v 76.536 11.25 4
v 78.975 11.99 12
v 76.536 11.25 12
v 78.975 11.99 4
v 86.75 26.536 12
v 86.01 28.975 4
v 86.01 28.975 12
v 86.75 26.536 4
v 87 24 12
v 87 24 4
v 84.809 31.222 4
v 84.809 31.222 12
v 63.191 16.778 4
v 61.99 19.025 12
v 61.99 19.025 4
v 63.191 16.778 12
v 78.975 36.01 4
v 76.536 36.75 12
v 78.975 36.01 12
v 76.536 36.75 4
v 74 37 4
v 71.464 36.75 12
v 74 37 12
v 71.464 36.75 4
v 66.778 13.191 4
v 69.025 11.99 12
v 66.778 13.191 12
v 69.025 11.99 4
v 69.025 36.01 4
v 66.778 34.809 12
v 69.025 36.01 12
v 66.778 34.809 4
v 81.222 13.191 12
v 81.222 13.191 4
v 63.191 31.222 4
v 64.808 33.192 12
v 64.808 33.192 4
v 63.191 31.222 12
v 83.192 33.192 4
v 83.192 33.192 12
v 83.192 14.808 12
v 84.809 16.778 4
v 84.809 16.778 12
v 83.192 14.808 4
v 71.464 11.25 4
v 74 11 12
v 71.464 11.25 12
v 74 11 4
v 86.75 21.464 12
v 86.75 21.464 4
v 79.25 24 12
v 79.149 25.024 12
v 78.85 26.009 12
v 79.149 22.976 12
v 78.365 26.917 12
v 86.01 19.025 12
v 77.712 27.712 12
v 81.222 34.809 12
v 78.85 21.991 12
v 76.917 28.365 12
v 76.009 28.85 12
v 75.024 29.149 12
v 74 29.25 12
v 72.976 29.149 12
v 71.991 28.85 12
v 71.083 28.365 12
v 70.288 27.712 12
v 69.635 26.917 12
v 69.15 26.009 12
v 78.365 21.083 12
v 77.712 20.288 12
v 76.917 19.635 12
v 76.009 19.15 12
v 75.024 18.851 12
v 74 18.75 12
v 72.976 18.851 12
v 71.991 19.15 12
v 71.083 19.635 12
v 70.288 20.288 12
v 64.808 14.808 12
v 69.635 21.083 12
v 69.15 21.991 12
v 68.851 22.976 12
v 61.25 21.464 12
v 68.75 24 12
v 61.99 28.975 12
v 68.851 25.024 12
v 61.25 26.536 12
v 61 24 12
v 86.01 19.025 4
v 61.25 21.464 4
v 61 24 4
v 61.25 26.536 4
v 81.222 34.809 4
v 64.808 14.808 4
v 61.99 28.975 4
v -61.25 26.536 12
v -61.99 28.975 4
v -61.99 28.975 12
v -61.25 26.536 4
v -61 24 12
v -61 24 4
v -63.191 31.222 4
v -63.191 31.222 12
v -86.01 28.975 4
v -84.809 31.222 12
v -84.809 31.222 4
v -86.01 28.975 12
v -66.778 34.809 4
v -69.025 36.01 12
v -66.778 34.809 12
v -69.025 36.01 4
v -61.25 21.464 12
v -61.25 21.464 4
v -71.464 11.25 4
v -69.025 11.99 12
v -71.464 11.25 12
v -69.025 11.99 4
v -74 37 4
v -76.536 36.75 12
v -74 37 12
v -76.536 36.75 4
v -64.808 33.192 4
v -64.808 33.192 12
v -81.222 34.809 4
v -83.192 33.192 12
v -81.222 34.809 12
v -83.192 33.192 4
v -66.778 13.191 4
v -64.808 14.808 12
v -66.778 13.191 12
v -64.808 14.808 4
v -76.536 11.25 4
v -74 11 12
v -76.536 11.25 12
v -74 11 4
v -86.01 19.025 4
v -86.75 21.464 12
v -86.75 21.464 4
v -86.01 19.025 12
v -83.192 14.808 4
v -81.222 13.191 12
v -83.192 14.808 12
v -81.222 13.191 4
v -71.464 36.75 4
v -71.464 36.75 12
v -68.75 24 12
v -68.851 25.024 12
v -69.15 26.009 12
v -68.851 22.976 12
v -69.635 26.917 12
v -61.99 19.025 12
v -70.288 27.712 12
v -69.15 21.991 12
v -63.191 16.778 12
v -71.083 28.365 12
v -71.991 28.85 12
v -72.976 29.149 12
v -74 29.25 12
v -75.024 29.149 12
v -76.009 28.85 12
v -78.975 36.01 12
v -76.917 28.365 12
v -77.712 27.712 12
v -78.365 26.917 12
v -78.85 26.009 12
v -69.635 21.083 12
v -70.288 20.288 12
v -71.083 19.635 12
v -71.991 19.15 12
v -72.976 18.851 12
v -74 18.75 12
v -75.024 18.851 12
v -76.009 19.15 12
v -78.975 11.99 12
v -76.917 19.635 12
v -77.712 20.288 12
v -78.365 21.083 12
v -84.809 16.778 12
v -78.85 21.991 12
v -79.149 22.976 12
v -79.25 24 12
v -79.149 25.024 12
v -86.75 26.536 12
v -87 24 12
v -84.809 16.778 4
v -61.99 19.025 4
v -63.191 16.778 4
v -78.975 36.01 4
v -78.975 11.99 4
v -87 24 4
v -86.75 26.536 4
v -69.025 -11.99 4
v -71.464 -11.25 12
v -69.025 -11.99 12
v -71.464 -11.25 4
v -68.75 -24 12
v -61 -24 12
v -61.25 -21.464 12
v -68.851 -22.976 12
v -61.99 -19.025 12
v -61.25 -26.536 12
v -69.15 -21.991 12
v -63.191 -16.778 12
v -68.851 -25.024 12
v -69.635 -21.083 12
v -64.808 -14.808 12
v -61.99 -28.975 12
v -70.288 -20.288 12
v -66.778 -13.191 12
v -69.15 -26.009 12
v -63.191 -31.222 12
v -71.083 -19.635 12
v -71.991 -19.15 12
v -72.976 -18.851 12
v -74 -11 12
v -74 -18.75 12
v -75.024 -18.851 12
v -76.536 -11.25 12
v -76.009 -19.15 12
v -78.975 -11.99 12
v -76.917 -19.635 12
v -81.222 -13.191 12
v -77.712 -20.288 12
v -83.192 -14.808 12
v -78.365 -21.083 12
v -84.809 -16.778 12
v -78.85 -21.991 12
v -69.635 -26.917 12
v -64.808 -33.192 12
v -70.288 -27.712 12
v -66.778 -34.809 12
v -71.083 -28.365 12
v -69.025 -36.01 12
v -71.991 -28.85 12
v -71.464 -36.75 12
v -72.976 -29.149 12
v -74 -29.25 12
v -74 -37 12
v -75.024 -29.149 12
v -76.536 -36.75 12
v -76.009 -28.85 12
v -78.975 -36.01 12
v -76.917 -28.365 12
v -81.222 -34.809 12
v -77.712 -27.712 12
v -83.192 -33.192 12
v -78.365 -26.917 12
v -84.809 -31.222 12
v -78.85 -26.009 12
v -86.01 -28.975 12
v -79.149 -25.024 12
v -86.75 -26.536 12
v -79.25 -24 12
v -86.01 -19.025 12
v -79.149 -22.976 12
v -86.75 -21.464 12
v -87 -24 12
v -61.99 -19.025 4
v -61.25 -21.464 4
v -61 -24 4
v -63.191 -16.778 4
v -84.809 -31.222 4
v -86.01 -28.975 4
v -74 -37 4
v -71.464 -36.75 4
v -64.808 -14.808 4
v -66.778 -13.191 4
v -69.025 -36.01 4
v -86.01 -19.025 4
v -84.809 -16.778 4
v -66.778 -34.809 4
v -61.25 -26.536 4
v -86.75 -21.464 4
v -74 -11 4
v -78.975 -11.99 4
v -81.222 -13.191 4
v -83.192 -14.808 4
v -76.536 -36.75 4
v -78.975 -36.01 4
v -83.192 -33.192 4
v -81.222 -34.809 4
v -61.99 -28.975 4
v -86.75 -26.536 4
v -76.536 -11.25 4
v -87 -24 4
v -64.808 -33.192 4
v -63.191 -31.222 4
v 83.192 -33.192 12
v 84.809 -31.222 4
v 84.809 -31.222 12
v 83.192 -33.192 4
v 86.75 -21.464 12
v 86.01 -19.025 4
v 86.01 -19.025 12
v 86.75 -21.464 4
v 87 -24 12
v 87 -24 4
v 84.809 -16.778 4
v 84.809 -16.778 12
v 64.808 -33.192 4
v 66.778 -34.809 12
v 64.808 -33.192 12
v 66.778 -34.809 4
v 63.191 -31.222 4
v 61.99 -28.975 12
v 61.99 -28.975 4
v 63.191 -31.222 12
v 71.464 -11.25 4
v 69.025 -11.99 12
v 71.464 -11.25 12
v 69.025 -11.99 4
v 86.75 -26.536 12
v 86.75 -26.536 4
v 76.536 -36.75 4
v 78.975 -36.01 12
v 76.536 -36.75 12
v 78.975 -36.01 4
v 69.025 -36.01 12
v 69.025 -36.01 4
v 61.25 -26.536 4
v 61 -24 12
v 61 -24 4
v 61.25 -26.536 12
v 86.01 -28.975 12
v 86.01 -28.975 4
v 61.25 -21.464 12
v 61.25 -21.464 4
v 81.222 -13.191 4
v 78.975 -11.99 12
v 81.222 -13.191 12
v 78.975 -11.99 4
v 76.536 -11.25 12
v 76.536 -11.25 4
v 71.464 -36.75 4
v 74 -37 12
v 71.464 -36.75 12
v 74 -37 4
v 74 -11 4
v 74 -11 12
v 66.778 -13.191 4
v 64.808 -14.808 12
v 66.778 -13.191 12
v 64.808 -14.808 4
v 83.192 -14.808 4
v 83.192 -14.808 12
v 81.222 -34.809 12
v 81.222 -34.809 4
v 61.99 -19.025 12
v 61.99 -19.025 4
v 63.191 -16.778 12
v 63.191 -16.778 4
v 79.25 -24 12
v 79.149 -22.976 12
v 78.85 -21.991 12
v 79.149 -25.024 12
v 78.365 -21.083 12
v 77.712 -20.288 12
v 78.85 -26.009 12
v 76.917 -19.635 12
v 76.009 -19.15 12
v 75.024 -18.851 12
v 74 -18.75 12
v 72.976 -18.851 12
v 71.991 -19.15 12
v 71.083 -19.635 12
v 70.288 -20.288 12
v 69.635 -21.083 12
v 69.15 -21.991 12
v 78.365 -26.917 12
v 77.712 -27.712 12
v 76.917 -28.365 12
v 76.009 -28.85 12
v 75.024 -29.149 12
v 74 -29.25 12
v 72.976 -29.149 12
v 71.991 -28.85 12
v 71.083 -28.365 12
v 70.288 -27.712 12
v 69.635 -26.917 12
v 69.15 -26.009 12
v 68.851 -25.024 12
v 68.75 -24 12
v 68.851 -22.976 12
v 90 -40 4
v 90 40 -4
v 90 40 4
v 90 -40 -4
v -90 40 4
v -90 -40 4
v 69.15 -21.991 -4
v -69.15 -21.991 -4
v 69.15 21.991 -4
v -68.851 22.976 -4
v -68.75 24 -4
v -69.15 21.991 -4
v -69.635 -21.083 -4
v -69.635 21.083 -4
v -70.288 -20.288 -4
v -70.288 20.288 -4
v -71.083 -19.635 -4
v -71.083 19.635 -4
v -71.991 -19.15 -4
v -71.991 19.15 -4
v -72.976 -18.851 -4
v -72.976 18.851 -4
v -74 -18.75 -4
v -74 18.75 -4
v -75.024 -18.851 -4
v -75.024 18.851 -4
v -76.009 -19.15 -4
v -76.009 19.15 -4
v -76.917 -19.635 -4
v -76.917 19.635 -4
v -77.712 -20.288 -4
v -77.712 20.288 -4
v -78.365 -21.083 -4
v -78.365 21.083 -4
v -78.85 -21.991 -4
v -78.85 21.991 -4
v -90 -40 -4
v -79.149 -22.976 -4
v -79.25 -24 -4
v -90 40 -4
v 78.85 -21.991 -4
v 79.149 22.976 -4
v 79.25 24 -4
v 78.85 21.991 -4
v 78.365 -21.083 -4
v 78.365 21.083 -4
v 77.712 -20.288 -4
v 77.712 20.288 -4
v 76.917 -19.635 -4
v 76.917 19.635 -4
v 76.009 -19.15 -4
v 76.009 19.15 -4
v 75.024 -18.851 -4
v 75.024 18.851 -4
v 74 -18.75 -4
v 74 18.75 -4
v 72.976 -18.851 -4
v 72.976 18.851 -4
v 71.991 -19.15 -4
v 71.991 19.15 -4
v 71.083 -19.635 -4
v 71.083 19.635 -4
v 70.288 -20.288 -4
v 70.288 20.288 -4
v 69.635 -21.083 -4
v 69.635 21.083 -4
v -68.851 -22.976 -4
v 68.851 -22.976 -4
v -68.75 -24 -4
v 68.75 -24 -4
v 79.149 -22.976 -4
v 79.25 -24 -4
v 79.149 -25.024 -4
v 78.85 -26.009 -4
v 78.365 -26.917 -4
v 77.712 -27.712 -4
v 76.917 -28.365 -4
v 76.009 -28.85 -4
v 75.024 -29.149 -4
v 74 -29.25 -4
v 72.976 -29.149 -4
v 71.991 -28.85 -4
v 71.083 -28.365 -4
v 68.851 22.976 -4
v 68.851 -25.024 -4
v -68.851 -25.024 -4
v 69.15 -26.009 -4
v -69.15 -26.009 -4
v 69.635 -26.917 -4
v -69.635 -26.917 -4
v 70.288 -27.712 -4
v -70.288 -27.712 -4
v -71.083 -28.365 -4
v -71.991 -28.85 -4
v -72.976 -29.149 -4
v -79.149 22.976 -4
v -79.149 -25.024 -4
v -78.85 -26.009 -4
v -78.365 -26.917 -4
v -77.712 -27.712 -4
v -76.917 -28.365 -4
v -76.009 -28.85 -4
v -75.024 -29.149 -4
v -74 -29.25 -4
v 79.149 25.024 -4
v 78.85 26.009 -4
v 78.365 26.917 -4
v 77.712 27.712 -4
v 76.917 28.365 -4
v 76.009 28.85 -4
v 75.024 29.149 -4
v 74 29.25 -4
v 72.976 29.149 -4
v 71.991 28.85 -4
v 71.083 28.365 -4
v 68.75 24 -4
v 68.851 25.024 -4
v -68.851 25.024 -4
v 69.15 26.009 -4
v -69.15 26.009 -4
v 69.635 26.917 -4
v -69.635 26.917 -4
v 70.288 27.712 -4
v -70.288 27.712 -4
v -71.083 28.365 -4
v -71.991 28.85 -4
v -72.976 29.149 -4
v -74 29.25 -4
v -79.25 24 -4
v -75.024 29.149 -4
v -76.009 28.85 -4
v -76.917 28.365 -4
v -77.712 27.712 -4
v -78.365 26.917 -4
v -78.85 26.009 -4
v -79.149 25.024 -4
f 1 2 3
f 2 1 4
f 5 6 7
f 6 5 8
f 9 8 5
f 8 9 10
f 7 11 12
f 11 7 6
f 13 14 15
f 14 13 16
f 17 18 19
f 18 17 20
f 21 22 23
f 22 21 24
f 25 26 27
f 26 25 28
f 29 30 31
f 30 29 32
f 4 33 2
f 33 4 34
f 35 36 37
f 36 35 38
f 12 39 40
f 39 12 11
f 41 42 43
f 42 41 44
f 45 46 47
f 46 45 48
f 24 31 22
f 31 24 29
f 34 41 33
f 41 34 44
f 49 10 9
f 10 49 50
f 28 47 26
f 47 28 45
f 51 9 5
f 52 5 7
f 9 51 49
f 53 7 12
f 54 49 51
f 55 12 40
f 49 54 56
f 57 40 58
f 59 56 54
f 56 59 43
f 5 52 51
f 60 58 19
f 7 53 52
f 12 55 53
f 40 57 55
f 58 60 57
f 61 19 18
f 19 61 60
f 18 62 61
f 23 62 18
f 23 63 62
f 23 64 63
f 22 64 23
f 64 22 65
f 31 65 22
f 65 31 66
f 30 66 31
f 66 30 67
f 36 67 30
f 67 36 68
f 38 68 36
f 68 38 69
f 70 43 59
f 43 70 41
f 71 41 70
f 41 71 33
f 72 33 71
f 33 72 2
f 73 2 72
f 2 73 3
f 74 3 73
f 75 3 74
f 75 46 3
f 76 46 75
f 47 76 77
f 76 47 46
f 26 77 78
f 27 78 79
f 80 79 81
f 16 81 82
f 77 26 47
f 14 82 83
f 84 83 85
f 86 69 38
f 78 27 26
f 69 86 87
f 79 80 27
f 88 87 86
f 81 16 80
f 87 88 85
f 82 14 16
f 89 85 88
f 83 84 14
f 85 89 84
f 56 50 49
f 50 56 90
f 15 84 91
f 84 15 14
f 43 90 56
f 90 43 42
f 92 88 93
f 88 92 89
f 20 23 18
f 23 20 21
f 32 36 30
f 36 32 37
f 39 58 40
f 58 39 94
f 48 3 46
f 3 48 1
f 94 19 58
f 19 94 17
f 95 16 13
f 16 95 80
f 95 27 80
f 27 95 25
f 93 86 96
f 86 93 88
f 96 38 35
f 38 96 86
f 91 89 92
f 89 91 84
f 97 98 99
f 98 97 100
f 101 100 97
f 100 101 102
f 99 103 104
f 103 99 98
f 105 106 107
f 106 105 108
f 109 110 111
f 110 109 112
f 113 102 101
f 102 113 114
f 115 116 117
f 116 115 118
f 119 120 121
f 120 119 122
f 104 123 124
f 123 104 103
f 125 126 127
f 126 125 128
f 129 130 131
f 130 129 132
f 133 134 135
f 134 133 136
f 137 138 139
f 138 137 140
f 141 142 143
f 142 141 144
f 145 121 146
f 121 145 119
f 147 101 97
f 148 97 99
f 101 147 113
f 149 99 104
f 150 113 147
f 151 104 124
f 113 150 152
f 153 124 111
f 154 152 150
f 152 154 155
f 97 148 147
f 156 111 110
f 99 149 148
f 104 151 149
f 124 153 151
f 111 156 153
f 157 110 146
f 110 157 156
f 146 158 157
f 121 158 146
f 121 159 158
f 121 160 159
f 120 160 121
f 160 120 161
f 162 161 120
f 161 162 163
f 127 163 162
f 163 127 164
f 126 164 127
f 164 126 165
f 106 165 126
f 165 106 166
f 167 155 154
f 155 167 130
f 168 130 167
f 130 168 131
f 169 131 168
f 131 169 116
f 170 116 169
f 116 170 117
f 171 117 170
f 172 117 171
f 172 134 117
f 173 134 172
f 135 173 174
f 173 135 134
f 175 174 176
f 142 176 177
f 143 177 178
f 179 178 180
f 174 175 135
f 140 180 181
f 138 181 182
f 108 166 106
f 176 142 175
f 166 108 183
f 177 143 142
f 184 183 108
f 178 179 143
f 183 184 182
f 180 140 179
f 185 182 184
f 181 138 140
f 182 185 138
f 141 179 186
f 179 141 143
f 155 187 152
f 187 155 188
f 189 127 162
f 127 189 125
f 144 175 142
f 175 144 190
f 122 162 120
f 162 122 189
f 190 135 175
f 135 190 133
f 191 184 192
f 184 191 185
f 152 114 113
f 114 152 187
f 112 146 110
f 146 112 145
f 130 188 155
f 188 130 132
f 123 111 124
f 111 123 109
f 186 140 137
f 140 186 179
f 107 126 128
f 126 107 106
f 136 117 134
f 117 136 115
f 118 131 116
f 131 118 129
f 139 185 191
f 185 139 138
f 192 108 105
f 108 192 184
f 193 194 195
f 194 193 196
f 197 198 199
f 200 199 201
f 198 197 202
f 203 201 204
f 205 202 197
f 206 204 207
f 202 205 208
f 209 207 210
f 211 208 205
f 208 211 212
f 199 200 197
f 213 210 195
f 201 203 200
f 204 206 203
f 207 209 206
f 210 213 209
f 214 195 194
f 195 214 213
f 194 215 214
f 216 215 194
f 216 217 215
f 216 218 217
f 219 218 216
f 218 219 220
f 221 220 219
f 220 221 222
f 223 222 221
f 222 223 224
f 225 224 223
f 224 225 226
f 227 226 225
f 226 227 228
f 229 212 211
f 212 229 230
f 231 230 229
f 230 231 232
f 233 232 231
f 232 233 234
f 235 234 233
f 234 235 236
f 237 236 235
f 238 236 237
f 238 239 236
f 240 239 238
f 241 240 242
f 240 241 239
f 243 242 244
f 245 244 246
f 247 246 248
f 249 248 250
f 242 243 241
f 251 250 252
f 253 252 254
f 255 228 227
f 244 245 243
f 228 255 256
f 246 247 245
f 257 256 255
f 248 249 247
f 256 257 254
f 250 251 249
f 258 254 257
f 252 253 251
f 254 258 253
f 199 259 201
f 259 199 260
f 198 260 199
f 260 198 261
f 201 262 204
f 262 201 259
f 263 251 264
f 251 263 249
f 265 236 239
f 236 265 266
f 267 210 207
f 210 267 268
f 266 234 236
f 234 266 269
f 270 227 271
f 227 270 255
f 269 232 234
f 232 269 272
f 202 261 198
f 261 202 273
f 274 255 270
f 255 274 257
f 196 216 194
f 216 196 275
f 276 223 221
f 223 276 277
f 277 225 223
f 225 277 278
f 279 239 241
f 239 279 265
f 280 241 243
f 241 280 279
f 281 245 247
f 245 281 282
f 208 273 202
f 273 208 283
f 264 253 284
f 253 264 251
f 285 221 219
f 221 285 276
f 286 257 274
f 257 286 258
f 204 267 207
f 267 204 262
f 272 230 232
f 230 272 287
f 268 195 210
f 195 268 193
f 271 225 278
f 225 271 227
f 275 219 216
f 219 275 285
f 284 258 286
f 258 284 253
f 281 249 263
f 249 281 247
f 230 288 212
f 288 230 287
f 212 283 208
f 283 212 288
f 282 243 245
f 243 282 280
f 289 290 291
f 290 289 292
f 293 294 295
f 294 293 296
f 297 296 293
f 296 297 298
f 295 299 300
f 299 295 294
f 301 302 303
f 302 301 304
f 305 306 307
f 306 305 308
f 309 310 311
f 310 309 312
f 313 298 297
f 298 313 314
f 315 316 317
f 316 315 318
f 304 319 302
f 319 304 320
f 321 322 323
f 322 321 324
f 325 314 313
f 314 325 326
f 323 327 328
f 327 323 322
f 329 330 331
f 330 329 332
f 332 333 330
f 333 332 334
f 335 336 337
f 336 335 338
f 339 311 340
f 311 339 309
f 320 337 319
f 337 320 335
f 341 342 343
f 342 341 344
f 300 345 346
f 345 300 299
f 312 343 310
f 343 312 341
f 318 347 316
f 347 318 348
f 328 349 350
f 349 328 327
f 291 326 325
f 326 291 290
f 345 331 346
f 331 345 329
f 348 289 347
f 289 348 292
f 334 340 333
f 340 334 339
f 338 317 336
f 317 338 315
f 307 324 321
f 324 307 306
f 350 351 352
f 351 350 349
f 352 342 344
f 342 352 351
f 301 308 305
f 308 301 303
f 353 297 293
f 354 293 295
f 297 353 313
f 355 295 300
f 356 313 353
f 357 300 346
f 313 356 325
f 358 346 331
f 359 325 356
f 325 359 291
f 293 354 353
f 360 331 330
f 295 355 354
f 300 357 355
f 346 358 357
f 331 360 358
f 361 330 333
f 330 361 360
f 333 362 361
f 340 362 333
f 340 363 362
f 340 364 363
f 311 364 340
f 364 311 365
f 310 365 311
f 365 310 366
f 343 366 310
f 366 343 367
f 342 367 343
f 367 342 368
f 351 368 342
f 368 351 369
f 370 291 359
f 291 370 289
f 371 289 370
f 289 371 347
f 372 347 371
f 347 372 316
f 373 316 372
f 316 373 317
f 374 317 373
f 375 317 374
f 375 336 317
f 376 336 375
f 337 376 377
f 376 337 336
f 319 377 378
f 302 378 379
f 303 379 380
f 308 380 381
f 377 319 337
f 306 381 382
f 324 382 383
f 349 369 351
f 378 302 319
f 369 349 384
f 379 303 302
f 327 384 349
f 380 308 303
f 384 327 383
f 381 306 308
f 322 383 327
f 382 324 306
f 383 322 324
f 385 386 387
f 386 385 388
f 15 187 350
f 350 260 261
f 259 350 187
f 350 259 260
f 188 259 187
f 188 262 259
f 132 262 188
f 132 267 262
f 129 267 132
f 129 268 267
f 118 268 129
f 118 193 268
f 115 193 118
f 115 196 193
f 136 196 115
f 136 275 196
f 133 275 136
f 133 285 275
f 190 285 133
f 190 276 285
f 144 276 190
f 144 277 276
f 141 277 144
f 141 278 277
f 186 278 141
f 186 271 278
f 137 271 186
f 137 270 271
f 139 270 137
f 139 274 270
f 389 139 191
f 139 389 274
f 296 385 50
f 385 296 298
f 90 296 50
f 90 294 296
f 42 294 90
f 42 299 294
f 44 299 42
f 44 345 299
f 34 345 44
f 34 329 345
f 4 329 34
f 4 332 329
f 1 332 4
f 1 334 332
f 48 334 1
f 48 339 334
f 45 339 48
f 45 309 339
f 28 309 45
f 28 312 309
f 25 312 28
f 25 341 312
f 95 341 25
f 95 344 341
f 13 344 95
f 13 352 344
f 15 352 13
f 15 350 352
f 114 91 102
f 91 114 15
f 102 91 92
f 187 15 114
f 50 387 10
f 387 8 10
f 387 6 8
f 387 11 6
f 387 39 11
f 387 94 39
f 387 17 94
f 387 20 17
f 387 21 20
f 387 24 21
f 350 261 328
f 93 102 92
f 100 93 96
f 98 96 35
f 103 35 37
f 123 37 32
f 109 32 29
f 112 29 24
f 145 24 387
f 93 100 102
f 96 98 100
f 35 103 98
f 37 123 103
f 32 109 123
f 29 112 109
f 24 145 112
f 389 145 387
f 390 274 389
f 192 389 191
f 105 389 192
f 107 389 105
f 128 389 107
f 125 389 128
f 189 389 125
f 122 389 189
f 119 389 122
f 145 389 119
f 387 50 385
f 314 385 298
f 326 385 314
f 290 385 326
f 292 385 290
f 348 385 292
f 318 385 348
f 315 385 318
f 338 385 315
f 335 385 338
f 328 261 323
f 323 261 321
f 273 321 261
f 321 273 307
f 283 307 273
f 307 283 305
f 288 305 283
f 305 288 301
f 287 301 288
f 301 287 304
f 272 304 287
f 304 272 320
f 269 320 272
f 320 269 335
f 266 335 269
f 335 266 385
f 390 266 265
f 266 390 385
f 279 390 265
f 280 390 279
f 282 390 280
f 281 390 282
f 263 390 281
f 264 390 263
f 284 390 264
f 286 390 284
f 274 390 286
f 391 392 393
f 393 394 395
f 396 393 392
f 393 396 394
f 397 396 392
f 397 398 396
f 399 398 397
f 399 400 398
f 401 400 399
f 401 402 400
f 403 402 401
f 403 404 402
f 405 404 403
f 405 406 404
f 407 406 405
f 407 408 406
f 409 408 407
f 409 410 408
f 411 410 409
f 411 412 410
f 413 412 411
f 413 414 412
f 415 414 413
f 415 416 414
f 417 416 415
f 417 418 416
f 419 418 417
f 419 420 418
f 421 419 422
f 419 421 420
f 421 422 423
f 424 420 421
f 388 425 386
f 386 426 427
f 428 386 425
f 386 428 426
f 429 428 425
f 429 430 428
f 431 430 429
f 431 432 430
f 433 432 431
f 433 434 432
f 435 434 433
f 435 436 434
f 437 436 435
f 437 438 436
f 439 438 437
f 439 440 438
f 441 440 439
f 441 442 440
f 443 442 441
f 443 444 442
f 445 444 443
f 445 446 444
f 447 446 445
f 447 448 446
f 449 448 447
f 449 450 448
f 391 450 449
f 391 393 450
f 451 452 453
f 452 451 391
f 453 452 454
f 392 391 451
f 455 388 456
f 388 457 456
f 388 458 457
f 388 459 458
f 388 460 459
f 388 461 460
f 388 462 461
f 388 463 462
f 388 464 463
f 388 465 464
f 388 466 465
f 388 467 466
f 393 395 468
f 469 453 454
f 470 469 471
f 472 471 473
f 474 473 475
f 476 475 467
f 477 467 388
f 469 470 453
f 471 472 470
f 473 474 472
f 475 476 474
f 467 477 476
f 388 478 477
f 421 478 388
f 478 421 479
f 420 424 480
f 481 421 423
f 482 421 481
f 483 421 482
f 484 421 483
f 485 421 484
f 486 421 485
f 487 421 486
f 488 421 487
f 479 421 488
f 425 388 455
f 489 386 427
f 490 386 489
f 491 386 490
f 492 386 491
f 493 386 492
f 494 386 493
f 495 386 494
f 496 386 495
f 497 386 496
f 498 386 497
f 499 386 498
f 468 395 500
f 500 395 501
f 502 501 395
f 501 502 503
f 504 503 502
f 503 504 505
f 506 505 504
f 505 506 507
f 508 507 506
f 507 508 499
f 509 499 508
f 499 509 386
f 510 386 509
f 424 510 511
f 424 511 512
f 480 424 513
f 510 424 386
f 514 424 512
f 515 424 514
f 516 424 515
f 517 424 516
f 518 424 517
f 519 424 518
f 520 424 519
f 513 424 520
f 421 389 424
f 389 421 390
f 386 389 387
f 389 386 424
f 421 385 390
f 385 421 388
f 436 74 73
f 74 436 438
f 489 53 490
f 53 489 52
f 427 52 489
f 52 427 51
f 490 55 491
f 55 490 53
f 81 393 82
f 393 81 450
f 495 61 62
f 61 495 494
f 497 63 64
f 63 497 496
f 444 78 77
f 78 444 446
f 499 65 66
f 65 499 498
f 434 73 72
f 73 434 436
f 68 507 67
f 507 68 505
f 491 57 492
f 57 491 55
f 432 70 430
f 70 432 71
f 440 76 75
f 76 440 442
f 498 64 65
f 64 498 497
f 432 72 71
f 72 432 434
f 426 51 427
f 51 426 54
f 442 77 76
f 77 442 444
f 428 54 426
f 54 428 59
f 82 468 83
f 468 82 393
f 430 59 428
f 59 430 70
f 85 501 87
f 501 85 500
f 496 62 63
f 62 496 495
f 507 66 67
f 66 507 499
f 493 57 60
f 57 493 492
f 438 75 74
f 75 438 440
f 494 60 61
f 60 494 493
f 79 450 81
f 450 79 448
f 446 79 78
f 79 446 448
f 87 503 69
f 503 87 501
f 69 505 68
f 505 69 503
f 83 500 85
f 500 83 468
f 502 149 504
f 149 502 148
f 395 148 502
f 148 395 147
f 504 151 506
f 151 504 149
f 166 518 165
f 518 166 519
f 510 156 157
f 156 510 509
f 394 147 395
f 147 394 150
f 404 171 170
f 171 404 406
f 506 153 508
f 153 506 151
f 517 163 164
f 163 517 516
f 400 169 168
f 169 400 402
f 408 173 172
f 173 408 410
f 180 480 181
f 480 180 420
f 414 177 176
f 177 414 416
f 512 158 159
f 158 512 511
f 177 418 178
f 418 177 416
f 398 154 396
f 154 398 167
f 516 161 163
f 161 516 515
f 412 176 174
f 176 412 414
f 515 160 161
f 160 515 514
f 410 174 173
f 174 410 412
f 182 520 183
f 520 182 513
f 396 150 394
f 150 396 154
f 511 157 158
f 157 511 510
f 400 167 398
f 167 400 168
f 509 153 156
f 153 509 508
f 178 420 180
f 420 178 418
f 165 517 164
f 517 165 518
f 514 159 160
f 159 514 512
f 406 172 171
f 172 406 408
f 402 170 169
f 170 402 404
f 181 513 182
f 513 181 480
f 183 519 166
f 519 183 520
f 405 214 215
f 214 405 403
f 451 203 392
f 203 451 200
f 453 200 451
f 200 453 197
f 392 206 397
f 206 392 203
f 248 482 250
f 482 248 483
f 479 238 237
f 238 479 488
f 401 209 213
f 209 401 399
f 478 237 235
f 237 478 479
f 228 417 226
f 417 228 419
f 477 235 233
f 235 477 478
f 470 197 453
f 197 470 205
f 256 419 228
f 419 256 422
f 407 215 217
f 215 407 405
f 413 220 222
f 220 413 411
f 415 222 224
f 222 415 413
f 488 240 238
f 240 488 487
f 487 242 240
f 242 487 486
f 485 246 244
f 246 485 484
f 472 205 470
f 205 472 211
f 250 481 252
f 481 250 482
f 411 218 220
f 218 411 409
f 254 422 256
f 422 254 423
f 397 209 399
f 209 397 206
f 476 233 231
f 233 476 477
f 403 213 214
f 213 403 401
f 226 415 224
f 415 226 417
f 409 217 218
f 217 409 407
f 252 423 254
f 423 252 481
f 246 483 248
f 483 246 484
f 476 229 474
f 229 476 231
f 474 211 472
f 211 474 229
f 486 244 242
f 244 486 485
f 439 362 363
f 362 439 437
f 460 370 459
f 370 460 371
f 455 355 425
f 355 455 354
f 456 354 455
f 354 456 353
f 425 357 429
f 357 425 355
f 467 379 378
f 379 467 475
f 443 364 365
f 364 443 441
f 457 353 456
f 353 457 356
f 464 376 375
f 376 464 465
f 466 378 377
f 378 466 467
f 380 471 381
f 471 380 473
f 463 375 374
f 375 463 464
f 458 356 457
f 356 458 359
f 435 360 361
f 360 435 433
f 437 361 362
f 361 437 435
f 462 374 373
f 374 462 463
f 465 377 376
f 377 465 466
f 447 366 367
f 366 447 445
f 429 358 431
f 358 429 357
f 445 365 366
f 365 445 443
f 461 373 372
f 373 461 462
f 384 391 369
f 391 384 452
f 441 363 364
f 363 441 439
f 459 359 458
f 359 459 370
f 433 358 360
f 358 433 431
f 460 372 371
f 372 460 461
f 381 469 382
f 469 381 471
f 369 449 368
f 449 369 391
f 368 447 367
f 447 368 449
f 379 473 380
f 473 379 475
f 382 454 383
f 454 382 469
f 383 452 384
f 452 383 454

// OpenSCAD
$fn = 32;

// ----------------------------------------------------------------------
// Anchor pads 180 x 80 x 16
// four corner bosses with anchor holes
// ----------------------------------------------------------------------

// --- parameters (mm) ---
plate = [180, 80, 8];  // base plate size (x, y, z)
seat_tol = 0.15;       // tolerance at the seating features
free_tol = 0.5;        // general tolerance on the free sizes
pads = 4;              // boss count, one per corner
edge = 16;             // boss centre offset from the plate edge
boss_d = 26;           // boss diameter
boss_h = 8;            // boss height above the base plate
hole_d = 10.5;         // hole diameter

// --- derived feature positions (mm) ---
height = plate[2] + boss_h;      // = 16   overall height of the part
corner_x = plate[0] / 2 - edge;  // = 74   boss centre X
corner_y = plate[1] / 2 - edge;  // = 24   boss centre Y
feature_centers = [
  [corner_x, corner_y],
  [-corner_x, corner_y],
  [-corner_x, -corner_y],
  [corner_x, -corner_y]
];   // boss centres, anchor holes are drilled there

// base plate, four bosses standing on it, anchor holes all the way through
difference() {
  union() {
    cube(plate, center = true);
    for (centre = feature_centers)
      translate([centre[0], centre[1], plate[2] / 2 - 1])
        cylinder(d = boss_d, h = boss_h + 1);
  }
  for (centre = feature_centers)
    translate([centre[0], centre[1], -height])
      cylinder(d = hole_d, h = 2 * height + 2);  // through boss and plate
}
